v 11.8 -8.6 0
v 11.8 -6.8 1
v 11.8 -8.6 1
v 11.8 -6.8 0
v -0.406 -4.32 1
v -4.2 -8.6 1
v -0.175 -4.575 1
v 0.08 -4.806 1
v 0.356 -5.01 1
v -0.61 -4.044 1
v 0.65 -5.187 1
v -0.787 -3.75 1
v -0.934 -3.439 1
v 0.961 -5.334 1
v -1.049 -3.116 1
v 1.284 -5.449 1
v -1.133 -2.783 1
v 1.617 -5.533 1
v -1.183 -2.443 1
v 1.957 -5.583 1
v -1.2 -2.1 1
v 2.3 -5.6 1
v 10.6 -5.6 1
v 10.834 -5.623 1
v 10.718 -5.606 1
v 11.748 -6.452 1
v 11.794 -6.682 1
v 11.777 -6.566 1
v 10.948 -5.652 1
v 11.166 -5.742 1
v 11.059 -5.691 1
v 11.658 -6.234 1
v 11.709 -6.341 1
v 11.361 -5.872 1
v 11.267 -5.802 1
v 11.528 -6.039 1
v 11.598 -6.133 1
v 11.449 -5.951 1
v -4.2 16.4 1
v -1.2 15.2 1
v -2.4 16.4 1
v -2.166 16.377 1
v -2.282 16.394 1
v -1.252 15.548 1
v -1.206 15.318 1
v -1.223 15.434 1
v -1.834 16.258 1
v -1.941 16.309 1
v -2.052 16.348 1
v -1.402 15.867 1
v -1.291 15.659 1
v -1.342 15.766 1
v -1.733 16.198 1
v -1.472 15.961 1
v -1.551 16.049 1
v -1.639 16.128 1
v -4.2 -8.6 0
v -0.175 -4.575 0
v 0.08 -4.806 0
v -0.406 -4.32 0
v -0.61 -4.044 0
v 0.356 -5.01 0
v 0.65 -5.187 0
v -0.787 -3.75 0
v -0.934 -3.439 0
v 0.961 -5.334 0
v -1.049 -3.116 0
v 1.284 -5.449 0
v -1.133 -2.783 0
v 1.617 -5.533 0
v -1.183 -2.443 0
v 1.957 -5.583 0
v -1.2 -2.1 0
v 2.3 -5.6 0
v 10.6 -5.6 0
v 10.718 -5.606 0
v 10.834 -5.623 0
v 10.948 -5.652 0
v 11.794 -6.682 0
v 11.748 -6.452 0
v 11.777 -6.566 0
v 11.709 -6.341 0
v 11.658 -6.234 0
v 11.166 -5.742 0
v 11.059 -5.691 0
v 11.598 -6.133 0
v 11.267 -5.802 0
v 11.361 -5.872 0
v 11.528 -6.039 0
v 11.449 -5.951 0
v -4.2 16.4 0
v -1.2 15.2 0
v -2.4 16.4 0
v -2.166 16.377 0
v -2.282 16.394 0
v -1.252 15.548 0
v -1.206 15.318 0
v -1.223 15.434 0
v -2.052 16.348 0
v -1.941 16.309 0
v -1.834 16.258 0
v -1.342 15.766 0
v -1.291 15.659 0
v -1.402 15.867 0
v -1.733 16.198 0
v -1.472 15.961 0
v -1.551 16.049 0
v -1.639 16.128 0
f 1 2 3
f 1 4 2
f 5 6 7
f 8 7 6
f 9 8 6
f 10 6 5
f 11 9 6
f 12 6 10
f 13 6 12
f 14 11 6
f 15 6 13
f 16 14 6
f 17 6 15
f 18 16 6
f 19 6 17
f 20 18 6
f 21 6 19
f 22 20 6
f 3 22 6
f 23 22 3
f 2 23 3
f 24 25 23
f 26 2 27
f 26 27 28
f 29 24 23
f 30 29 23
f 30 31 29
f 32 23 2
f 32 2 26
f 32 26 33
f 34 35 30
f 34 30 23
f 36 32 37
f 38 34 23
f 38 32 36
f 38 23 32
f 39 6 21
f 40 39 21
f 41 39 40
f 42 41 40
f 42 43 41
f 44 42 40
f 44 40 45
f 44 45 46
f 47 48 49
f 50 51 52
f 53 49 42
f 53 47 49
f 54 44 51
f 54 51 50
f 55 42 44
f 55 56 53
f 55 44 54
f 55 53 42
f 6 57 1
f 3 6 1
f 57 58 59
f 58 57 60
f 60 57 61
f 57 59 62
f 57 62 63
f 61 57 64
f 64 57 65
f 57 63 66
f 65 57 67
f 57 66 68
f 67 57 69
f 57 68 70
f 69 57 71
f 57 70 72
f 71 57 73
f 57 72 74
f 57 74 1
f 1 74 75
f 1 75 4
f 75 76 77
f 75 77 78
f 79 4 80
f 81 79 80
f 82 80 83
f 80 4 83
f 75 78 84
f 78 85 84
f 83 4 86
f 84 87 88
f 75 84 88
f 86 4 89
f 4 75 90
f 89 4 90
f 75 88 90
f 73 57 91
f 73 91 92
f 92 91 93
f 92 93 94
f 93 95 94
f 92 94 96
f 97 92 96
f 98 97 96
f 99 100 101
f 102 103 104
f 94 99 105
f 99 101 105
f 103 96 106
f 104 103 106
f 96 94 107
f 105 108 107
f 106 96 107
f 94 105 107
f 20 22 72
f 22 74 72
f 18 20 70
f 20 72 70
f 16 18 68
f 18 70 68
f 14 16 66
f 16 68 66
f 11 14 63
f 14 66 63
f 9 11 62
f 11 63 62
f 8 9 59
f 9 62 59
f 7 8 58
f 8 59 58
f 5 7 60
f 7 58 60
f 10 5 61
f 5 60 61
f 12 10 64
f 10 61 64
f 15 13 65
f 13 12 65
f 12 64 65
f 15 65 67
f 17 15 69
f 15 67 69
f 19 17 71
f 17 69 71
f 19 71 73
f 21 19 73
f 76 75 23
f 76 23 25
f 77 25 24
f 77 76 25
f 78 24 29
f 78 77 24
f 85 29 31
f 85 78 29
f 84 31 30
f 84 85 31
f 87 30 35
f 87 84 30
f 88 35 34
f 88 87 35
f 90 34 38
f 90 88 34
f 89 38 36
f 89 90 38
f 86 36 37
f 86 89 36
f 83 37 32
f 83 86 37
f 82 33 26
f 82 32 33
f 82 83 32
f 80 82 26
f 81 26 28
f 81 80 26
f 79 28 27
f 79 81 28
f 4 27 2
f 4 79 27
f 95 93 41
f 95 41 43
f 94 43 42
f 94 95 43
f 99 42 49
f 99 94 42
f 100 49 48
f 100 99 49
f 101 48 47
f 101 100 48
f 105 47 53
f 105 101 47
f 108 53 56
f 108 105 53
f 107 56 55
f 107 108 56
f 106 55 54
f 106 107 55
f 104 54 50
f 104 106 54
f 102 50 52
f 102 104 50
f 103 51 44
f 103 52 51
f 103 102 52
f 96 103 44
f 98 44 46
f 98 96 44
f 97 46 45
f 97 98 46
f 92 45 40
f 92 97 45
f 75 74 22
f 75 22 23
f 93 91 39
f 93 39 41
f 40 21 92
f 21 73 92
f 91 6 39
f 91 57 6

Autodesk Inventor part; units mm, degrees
ref_plane "YZ Plane" through (0, 0, 0) normal (1, 0, 0) x (0, 1, 0)
ref_plane "Начальная плоскость" through (0, 0, 0) normal (0, 0, 1) x (1, 0, 0)
ref_plane "Конечная плоскость" through (0, 0, 1) normal (0, 0, 1) x (1, 0, 0)
sketch "Эскиз" plane through (0, 0, 0) normal (0, 0, 1) x (1, 0, 0)
  line L0 (-1.2, -2.1) -> (-1.2, 15.2)
  line L1 (-4.2, 16.4) -> (-2.4, 16.4)
  line L2 (-4.2, -8.6) -> (-4.2, 16.4)
  line L3 (-4.2, -8.6) -> (11.8, -8.6)
  line L4 (11.8, -6.8) -> (11.8, -8.6)
  line L5 (2.3, -5.6) -> (10.6, -5.6)
  arc A0 (-1.2, -2.1) -> (2.3, -5.6) centre (2.3, -2.1) ccw
  arc A1 (-1.2, 15.2) -> (-2.4, 16.4) centre (-2.4, 15.2) ccw
  arc A2 (11.8, -6.8) -> (10.6, -5.6) centre (10.6, -6.8) ccw
  line L6 (11.8, 0) -> (-4.2, 0) construction
  line L7 (0, -8.6) -> (0, 16.4) construction
  line L8 (0, 0) -> (16, 0) construction
  point P0 (-1.2, -5.6)
  point P1 (-1.2, 16.4)
  point P2 (11.8, -5.6)
  dimension "d17" = 3.5
  dimension "d19" = 1.2
  dimension "d26" = 8.6
  dimension "d27" = 4.2
  dimension "d28" = 25
  dimension "d29" = 16
  dimension "d30" = 3
  dimension "d31" = 3
  dimension "d32" = 90
extrude "Базовый элемент" add sketch "Эскиз" along normal up to surface (1 mm away) from surface at 0
sketch "Sketch3" plane through (0, 0, 0) normal (0, 0, 1) x (1, 0, 0)
  line L0 (0, 0) -> (10, 0)
ref_plane "Work Plane10" through (0, 0, 0) normal (0, -1, 0) x (1, 0, 0)
sketch "Sketch4" plane through (0, 0, 0) normal (0, -1, 0) x (1, 0, 0)
  line L0 (-2, 0) -> (12, 0)
  line L1 (-2, 1) -> (12, 1)
  dimension "d25" = 1
equation "\"d17\" = R"
equation "\"d19\" = r1"
equation "\"d26\" = ey"
equation "\"d27\" = ex"
equation "\"d28\" = b"
equation "\"d29\" = a"
equation "\"d30\" = ParT"
equation "\"d31\" = ParT"
equation "\"d11\" = G_L"
equation "\"b\" = 25"
equation "\"ParT\" = 3"
equation "\"R\" = 3.5"
equation "\"G_L\" = d25"
equation "\"r1\" = 1.2"
equation "\"G_OFFSET_START\" = 0"
equation "\"G_OFFSET_END\" = 0"
equation "\"d21\" = G_OFFSET_END + B_L"
equation "\"ex\" = 4.2"
equation "\"ey\" = 8.6"
equation "\"B_L\" = 1"
equation "\"a\" = 16"
properties part number "Кутик ДСТУ 2251" material "С245 ДСТУ 8539"
